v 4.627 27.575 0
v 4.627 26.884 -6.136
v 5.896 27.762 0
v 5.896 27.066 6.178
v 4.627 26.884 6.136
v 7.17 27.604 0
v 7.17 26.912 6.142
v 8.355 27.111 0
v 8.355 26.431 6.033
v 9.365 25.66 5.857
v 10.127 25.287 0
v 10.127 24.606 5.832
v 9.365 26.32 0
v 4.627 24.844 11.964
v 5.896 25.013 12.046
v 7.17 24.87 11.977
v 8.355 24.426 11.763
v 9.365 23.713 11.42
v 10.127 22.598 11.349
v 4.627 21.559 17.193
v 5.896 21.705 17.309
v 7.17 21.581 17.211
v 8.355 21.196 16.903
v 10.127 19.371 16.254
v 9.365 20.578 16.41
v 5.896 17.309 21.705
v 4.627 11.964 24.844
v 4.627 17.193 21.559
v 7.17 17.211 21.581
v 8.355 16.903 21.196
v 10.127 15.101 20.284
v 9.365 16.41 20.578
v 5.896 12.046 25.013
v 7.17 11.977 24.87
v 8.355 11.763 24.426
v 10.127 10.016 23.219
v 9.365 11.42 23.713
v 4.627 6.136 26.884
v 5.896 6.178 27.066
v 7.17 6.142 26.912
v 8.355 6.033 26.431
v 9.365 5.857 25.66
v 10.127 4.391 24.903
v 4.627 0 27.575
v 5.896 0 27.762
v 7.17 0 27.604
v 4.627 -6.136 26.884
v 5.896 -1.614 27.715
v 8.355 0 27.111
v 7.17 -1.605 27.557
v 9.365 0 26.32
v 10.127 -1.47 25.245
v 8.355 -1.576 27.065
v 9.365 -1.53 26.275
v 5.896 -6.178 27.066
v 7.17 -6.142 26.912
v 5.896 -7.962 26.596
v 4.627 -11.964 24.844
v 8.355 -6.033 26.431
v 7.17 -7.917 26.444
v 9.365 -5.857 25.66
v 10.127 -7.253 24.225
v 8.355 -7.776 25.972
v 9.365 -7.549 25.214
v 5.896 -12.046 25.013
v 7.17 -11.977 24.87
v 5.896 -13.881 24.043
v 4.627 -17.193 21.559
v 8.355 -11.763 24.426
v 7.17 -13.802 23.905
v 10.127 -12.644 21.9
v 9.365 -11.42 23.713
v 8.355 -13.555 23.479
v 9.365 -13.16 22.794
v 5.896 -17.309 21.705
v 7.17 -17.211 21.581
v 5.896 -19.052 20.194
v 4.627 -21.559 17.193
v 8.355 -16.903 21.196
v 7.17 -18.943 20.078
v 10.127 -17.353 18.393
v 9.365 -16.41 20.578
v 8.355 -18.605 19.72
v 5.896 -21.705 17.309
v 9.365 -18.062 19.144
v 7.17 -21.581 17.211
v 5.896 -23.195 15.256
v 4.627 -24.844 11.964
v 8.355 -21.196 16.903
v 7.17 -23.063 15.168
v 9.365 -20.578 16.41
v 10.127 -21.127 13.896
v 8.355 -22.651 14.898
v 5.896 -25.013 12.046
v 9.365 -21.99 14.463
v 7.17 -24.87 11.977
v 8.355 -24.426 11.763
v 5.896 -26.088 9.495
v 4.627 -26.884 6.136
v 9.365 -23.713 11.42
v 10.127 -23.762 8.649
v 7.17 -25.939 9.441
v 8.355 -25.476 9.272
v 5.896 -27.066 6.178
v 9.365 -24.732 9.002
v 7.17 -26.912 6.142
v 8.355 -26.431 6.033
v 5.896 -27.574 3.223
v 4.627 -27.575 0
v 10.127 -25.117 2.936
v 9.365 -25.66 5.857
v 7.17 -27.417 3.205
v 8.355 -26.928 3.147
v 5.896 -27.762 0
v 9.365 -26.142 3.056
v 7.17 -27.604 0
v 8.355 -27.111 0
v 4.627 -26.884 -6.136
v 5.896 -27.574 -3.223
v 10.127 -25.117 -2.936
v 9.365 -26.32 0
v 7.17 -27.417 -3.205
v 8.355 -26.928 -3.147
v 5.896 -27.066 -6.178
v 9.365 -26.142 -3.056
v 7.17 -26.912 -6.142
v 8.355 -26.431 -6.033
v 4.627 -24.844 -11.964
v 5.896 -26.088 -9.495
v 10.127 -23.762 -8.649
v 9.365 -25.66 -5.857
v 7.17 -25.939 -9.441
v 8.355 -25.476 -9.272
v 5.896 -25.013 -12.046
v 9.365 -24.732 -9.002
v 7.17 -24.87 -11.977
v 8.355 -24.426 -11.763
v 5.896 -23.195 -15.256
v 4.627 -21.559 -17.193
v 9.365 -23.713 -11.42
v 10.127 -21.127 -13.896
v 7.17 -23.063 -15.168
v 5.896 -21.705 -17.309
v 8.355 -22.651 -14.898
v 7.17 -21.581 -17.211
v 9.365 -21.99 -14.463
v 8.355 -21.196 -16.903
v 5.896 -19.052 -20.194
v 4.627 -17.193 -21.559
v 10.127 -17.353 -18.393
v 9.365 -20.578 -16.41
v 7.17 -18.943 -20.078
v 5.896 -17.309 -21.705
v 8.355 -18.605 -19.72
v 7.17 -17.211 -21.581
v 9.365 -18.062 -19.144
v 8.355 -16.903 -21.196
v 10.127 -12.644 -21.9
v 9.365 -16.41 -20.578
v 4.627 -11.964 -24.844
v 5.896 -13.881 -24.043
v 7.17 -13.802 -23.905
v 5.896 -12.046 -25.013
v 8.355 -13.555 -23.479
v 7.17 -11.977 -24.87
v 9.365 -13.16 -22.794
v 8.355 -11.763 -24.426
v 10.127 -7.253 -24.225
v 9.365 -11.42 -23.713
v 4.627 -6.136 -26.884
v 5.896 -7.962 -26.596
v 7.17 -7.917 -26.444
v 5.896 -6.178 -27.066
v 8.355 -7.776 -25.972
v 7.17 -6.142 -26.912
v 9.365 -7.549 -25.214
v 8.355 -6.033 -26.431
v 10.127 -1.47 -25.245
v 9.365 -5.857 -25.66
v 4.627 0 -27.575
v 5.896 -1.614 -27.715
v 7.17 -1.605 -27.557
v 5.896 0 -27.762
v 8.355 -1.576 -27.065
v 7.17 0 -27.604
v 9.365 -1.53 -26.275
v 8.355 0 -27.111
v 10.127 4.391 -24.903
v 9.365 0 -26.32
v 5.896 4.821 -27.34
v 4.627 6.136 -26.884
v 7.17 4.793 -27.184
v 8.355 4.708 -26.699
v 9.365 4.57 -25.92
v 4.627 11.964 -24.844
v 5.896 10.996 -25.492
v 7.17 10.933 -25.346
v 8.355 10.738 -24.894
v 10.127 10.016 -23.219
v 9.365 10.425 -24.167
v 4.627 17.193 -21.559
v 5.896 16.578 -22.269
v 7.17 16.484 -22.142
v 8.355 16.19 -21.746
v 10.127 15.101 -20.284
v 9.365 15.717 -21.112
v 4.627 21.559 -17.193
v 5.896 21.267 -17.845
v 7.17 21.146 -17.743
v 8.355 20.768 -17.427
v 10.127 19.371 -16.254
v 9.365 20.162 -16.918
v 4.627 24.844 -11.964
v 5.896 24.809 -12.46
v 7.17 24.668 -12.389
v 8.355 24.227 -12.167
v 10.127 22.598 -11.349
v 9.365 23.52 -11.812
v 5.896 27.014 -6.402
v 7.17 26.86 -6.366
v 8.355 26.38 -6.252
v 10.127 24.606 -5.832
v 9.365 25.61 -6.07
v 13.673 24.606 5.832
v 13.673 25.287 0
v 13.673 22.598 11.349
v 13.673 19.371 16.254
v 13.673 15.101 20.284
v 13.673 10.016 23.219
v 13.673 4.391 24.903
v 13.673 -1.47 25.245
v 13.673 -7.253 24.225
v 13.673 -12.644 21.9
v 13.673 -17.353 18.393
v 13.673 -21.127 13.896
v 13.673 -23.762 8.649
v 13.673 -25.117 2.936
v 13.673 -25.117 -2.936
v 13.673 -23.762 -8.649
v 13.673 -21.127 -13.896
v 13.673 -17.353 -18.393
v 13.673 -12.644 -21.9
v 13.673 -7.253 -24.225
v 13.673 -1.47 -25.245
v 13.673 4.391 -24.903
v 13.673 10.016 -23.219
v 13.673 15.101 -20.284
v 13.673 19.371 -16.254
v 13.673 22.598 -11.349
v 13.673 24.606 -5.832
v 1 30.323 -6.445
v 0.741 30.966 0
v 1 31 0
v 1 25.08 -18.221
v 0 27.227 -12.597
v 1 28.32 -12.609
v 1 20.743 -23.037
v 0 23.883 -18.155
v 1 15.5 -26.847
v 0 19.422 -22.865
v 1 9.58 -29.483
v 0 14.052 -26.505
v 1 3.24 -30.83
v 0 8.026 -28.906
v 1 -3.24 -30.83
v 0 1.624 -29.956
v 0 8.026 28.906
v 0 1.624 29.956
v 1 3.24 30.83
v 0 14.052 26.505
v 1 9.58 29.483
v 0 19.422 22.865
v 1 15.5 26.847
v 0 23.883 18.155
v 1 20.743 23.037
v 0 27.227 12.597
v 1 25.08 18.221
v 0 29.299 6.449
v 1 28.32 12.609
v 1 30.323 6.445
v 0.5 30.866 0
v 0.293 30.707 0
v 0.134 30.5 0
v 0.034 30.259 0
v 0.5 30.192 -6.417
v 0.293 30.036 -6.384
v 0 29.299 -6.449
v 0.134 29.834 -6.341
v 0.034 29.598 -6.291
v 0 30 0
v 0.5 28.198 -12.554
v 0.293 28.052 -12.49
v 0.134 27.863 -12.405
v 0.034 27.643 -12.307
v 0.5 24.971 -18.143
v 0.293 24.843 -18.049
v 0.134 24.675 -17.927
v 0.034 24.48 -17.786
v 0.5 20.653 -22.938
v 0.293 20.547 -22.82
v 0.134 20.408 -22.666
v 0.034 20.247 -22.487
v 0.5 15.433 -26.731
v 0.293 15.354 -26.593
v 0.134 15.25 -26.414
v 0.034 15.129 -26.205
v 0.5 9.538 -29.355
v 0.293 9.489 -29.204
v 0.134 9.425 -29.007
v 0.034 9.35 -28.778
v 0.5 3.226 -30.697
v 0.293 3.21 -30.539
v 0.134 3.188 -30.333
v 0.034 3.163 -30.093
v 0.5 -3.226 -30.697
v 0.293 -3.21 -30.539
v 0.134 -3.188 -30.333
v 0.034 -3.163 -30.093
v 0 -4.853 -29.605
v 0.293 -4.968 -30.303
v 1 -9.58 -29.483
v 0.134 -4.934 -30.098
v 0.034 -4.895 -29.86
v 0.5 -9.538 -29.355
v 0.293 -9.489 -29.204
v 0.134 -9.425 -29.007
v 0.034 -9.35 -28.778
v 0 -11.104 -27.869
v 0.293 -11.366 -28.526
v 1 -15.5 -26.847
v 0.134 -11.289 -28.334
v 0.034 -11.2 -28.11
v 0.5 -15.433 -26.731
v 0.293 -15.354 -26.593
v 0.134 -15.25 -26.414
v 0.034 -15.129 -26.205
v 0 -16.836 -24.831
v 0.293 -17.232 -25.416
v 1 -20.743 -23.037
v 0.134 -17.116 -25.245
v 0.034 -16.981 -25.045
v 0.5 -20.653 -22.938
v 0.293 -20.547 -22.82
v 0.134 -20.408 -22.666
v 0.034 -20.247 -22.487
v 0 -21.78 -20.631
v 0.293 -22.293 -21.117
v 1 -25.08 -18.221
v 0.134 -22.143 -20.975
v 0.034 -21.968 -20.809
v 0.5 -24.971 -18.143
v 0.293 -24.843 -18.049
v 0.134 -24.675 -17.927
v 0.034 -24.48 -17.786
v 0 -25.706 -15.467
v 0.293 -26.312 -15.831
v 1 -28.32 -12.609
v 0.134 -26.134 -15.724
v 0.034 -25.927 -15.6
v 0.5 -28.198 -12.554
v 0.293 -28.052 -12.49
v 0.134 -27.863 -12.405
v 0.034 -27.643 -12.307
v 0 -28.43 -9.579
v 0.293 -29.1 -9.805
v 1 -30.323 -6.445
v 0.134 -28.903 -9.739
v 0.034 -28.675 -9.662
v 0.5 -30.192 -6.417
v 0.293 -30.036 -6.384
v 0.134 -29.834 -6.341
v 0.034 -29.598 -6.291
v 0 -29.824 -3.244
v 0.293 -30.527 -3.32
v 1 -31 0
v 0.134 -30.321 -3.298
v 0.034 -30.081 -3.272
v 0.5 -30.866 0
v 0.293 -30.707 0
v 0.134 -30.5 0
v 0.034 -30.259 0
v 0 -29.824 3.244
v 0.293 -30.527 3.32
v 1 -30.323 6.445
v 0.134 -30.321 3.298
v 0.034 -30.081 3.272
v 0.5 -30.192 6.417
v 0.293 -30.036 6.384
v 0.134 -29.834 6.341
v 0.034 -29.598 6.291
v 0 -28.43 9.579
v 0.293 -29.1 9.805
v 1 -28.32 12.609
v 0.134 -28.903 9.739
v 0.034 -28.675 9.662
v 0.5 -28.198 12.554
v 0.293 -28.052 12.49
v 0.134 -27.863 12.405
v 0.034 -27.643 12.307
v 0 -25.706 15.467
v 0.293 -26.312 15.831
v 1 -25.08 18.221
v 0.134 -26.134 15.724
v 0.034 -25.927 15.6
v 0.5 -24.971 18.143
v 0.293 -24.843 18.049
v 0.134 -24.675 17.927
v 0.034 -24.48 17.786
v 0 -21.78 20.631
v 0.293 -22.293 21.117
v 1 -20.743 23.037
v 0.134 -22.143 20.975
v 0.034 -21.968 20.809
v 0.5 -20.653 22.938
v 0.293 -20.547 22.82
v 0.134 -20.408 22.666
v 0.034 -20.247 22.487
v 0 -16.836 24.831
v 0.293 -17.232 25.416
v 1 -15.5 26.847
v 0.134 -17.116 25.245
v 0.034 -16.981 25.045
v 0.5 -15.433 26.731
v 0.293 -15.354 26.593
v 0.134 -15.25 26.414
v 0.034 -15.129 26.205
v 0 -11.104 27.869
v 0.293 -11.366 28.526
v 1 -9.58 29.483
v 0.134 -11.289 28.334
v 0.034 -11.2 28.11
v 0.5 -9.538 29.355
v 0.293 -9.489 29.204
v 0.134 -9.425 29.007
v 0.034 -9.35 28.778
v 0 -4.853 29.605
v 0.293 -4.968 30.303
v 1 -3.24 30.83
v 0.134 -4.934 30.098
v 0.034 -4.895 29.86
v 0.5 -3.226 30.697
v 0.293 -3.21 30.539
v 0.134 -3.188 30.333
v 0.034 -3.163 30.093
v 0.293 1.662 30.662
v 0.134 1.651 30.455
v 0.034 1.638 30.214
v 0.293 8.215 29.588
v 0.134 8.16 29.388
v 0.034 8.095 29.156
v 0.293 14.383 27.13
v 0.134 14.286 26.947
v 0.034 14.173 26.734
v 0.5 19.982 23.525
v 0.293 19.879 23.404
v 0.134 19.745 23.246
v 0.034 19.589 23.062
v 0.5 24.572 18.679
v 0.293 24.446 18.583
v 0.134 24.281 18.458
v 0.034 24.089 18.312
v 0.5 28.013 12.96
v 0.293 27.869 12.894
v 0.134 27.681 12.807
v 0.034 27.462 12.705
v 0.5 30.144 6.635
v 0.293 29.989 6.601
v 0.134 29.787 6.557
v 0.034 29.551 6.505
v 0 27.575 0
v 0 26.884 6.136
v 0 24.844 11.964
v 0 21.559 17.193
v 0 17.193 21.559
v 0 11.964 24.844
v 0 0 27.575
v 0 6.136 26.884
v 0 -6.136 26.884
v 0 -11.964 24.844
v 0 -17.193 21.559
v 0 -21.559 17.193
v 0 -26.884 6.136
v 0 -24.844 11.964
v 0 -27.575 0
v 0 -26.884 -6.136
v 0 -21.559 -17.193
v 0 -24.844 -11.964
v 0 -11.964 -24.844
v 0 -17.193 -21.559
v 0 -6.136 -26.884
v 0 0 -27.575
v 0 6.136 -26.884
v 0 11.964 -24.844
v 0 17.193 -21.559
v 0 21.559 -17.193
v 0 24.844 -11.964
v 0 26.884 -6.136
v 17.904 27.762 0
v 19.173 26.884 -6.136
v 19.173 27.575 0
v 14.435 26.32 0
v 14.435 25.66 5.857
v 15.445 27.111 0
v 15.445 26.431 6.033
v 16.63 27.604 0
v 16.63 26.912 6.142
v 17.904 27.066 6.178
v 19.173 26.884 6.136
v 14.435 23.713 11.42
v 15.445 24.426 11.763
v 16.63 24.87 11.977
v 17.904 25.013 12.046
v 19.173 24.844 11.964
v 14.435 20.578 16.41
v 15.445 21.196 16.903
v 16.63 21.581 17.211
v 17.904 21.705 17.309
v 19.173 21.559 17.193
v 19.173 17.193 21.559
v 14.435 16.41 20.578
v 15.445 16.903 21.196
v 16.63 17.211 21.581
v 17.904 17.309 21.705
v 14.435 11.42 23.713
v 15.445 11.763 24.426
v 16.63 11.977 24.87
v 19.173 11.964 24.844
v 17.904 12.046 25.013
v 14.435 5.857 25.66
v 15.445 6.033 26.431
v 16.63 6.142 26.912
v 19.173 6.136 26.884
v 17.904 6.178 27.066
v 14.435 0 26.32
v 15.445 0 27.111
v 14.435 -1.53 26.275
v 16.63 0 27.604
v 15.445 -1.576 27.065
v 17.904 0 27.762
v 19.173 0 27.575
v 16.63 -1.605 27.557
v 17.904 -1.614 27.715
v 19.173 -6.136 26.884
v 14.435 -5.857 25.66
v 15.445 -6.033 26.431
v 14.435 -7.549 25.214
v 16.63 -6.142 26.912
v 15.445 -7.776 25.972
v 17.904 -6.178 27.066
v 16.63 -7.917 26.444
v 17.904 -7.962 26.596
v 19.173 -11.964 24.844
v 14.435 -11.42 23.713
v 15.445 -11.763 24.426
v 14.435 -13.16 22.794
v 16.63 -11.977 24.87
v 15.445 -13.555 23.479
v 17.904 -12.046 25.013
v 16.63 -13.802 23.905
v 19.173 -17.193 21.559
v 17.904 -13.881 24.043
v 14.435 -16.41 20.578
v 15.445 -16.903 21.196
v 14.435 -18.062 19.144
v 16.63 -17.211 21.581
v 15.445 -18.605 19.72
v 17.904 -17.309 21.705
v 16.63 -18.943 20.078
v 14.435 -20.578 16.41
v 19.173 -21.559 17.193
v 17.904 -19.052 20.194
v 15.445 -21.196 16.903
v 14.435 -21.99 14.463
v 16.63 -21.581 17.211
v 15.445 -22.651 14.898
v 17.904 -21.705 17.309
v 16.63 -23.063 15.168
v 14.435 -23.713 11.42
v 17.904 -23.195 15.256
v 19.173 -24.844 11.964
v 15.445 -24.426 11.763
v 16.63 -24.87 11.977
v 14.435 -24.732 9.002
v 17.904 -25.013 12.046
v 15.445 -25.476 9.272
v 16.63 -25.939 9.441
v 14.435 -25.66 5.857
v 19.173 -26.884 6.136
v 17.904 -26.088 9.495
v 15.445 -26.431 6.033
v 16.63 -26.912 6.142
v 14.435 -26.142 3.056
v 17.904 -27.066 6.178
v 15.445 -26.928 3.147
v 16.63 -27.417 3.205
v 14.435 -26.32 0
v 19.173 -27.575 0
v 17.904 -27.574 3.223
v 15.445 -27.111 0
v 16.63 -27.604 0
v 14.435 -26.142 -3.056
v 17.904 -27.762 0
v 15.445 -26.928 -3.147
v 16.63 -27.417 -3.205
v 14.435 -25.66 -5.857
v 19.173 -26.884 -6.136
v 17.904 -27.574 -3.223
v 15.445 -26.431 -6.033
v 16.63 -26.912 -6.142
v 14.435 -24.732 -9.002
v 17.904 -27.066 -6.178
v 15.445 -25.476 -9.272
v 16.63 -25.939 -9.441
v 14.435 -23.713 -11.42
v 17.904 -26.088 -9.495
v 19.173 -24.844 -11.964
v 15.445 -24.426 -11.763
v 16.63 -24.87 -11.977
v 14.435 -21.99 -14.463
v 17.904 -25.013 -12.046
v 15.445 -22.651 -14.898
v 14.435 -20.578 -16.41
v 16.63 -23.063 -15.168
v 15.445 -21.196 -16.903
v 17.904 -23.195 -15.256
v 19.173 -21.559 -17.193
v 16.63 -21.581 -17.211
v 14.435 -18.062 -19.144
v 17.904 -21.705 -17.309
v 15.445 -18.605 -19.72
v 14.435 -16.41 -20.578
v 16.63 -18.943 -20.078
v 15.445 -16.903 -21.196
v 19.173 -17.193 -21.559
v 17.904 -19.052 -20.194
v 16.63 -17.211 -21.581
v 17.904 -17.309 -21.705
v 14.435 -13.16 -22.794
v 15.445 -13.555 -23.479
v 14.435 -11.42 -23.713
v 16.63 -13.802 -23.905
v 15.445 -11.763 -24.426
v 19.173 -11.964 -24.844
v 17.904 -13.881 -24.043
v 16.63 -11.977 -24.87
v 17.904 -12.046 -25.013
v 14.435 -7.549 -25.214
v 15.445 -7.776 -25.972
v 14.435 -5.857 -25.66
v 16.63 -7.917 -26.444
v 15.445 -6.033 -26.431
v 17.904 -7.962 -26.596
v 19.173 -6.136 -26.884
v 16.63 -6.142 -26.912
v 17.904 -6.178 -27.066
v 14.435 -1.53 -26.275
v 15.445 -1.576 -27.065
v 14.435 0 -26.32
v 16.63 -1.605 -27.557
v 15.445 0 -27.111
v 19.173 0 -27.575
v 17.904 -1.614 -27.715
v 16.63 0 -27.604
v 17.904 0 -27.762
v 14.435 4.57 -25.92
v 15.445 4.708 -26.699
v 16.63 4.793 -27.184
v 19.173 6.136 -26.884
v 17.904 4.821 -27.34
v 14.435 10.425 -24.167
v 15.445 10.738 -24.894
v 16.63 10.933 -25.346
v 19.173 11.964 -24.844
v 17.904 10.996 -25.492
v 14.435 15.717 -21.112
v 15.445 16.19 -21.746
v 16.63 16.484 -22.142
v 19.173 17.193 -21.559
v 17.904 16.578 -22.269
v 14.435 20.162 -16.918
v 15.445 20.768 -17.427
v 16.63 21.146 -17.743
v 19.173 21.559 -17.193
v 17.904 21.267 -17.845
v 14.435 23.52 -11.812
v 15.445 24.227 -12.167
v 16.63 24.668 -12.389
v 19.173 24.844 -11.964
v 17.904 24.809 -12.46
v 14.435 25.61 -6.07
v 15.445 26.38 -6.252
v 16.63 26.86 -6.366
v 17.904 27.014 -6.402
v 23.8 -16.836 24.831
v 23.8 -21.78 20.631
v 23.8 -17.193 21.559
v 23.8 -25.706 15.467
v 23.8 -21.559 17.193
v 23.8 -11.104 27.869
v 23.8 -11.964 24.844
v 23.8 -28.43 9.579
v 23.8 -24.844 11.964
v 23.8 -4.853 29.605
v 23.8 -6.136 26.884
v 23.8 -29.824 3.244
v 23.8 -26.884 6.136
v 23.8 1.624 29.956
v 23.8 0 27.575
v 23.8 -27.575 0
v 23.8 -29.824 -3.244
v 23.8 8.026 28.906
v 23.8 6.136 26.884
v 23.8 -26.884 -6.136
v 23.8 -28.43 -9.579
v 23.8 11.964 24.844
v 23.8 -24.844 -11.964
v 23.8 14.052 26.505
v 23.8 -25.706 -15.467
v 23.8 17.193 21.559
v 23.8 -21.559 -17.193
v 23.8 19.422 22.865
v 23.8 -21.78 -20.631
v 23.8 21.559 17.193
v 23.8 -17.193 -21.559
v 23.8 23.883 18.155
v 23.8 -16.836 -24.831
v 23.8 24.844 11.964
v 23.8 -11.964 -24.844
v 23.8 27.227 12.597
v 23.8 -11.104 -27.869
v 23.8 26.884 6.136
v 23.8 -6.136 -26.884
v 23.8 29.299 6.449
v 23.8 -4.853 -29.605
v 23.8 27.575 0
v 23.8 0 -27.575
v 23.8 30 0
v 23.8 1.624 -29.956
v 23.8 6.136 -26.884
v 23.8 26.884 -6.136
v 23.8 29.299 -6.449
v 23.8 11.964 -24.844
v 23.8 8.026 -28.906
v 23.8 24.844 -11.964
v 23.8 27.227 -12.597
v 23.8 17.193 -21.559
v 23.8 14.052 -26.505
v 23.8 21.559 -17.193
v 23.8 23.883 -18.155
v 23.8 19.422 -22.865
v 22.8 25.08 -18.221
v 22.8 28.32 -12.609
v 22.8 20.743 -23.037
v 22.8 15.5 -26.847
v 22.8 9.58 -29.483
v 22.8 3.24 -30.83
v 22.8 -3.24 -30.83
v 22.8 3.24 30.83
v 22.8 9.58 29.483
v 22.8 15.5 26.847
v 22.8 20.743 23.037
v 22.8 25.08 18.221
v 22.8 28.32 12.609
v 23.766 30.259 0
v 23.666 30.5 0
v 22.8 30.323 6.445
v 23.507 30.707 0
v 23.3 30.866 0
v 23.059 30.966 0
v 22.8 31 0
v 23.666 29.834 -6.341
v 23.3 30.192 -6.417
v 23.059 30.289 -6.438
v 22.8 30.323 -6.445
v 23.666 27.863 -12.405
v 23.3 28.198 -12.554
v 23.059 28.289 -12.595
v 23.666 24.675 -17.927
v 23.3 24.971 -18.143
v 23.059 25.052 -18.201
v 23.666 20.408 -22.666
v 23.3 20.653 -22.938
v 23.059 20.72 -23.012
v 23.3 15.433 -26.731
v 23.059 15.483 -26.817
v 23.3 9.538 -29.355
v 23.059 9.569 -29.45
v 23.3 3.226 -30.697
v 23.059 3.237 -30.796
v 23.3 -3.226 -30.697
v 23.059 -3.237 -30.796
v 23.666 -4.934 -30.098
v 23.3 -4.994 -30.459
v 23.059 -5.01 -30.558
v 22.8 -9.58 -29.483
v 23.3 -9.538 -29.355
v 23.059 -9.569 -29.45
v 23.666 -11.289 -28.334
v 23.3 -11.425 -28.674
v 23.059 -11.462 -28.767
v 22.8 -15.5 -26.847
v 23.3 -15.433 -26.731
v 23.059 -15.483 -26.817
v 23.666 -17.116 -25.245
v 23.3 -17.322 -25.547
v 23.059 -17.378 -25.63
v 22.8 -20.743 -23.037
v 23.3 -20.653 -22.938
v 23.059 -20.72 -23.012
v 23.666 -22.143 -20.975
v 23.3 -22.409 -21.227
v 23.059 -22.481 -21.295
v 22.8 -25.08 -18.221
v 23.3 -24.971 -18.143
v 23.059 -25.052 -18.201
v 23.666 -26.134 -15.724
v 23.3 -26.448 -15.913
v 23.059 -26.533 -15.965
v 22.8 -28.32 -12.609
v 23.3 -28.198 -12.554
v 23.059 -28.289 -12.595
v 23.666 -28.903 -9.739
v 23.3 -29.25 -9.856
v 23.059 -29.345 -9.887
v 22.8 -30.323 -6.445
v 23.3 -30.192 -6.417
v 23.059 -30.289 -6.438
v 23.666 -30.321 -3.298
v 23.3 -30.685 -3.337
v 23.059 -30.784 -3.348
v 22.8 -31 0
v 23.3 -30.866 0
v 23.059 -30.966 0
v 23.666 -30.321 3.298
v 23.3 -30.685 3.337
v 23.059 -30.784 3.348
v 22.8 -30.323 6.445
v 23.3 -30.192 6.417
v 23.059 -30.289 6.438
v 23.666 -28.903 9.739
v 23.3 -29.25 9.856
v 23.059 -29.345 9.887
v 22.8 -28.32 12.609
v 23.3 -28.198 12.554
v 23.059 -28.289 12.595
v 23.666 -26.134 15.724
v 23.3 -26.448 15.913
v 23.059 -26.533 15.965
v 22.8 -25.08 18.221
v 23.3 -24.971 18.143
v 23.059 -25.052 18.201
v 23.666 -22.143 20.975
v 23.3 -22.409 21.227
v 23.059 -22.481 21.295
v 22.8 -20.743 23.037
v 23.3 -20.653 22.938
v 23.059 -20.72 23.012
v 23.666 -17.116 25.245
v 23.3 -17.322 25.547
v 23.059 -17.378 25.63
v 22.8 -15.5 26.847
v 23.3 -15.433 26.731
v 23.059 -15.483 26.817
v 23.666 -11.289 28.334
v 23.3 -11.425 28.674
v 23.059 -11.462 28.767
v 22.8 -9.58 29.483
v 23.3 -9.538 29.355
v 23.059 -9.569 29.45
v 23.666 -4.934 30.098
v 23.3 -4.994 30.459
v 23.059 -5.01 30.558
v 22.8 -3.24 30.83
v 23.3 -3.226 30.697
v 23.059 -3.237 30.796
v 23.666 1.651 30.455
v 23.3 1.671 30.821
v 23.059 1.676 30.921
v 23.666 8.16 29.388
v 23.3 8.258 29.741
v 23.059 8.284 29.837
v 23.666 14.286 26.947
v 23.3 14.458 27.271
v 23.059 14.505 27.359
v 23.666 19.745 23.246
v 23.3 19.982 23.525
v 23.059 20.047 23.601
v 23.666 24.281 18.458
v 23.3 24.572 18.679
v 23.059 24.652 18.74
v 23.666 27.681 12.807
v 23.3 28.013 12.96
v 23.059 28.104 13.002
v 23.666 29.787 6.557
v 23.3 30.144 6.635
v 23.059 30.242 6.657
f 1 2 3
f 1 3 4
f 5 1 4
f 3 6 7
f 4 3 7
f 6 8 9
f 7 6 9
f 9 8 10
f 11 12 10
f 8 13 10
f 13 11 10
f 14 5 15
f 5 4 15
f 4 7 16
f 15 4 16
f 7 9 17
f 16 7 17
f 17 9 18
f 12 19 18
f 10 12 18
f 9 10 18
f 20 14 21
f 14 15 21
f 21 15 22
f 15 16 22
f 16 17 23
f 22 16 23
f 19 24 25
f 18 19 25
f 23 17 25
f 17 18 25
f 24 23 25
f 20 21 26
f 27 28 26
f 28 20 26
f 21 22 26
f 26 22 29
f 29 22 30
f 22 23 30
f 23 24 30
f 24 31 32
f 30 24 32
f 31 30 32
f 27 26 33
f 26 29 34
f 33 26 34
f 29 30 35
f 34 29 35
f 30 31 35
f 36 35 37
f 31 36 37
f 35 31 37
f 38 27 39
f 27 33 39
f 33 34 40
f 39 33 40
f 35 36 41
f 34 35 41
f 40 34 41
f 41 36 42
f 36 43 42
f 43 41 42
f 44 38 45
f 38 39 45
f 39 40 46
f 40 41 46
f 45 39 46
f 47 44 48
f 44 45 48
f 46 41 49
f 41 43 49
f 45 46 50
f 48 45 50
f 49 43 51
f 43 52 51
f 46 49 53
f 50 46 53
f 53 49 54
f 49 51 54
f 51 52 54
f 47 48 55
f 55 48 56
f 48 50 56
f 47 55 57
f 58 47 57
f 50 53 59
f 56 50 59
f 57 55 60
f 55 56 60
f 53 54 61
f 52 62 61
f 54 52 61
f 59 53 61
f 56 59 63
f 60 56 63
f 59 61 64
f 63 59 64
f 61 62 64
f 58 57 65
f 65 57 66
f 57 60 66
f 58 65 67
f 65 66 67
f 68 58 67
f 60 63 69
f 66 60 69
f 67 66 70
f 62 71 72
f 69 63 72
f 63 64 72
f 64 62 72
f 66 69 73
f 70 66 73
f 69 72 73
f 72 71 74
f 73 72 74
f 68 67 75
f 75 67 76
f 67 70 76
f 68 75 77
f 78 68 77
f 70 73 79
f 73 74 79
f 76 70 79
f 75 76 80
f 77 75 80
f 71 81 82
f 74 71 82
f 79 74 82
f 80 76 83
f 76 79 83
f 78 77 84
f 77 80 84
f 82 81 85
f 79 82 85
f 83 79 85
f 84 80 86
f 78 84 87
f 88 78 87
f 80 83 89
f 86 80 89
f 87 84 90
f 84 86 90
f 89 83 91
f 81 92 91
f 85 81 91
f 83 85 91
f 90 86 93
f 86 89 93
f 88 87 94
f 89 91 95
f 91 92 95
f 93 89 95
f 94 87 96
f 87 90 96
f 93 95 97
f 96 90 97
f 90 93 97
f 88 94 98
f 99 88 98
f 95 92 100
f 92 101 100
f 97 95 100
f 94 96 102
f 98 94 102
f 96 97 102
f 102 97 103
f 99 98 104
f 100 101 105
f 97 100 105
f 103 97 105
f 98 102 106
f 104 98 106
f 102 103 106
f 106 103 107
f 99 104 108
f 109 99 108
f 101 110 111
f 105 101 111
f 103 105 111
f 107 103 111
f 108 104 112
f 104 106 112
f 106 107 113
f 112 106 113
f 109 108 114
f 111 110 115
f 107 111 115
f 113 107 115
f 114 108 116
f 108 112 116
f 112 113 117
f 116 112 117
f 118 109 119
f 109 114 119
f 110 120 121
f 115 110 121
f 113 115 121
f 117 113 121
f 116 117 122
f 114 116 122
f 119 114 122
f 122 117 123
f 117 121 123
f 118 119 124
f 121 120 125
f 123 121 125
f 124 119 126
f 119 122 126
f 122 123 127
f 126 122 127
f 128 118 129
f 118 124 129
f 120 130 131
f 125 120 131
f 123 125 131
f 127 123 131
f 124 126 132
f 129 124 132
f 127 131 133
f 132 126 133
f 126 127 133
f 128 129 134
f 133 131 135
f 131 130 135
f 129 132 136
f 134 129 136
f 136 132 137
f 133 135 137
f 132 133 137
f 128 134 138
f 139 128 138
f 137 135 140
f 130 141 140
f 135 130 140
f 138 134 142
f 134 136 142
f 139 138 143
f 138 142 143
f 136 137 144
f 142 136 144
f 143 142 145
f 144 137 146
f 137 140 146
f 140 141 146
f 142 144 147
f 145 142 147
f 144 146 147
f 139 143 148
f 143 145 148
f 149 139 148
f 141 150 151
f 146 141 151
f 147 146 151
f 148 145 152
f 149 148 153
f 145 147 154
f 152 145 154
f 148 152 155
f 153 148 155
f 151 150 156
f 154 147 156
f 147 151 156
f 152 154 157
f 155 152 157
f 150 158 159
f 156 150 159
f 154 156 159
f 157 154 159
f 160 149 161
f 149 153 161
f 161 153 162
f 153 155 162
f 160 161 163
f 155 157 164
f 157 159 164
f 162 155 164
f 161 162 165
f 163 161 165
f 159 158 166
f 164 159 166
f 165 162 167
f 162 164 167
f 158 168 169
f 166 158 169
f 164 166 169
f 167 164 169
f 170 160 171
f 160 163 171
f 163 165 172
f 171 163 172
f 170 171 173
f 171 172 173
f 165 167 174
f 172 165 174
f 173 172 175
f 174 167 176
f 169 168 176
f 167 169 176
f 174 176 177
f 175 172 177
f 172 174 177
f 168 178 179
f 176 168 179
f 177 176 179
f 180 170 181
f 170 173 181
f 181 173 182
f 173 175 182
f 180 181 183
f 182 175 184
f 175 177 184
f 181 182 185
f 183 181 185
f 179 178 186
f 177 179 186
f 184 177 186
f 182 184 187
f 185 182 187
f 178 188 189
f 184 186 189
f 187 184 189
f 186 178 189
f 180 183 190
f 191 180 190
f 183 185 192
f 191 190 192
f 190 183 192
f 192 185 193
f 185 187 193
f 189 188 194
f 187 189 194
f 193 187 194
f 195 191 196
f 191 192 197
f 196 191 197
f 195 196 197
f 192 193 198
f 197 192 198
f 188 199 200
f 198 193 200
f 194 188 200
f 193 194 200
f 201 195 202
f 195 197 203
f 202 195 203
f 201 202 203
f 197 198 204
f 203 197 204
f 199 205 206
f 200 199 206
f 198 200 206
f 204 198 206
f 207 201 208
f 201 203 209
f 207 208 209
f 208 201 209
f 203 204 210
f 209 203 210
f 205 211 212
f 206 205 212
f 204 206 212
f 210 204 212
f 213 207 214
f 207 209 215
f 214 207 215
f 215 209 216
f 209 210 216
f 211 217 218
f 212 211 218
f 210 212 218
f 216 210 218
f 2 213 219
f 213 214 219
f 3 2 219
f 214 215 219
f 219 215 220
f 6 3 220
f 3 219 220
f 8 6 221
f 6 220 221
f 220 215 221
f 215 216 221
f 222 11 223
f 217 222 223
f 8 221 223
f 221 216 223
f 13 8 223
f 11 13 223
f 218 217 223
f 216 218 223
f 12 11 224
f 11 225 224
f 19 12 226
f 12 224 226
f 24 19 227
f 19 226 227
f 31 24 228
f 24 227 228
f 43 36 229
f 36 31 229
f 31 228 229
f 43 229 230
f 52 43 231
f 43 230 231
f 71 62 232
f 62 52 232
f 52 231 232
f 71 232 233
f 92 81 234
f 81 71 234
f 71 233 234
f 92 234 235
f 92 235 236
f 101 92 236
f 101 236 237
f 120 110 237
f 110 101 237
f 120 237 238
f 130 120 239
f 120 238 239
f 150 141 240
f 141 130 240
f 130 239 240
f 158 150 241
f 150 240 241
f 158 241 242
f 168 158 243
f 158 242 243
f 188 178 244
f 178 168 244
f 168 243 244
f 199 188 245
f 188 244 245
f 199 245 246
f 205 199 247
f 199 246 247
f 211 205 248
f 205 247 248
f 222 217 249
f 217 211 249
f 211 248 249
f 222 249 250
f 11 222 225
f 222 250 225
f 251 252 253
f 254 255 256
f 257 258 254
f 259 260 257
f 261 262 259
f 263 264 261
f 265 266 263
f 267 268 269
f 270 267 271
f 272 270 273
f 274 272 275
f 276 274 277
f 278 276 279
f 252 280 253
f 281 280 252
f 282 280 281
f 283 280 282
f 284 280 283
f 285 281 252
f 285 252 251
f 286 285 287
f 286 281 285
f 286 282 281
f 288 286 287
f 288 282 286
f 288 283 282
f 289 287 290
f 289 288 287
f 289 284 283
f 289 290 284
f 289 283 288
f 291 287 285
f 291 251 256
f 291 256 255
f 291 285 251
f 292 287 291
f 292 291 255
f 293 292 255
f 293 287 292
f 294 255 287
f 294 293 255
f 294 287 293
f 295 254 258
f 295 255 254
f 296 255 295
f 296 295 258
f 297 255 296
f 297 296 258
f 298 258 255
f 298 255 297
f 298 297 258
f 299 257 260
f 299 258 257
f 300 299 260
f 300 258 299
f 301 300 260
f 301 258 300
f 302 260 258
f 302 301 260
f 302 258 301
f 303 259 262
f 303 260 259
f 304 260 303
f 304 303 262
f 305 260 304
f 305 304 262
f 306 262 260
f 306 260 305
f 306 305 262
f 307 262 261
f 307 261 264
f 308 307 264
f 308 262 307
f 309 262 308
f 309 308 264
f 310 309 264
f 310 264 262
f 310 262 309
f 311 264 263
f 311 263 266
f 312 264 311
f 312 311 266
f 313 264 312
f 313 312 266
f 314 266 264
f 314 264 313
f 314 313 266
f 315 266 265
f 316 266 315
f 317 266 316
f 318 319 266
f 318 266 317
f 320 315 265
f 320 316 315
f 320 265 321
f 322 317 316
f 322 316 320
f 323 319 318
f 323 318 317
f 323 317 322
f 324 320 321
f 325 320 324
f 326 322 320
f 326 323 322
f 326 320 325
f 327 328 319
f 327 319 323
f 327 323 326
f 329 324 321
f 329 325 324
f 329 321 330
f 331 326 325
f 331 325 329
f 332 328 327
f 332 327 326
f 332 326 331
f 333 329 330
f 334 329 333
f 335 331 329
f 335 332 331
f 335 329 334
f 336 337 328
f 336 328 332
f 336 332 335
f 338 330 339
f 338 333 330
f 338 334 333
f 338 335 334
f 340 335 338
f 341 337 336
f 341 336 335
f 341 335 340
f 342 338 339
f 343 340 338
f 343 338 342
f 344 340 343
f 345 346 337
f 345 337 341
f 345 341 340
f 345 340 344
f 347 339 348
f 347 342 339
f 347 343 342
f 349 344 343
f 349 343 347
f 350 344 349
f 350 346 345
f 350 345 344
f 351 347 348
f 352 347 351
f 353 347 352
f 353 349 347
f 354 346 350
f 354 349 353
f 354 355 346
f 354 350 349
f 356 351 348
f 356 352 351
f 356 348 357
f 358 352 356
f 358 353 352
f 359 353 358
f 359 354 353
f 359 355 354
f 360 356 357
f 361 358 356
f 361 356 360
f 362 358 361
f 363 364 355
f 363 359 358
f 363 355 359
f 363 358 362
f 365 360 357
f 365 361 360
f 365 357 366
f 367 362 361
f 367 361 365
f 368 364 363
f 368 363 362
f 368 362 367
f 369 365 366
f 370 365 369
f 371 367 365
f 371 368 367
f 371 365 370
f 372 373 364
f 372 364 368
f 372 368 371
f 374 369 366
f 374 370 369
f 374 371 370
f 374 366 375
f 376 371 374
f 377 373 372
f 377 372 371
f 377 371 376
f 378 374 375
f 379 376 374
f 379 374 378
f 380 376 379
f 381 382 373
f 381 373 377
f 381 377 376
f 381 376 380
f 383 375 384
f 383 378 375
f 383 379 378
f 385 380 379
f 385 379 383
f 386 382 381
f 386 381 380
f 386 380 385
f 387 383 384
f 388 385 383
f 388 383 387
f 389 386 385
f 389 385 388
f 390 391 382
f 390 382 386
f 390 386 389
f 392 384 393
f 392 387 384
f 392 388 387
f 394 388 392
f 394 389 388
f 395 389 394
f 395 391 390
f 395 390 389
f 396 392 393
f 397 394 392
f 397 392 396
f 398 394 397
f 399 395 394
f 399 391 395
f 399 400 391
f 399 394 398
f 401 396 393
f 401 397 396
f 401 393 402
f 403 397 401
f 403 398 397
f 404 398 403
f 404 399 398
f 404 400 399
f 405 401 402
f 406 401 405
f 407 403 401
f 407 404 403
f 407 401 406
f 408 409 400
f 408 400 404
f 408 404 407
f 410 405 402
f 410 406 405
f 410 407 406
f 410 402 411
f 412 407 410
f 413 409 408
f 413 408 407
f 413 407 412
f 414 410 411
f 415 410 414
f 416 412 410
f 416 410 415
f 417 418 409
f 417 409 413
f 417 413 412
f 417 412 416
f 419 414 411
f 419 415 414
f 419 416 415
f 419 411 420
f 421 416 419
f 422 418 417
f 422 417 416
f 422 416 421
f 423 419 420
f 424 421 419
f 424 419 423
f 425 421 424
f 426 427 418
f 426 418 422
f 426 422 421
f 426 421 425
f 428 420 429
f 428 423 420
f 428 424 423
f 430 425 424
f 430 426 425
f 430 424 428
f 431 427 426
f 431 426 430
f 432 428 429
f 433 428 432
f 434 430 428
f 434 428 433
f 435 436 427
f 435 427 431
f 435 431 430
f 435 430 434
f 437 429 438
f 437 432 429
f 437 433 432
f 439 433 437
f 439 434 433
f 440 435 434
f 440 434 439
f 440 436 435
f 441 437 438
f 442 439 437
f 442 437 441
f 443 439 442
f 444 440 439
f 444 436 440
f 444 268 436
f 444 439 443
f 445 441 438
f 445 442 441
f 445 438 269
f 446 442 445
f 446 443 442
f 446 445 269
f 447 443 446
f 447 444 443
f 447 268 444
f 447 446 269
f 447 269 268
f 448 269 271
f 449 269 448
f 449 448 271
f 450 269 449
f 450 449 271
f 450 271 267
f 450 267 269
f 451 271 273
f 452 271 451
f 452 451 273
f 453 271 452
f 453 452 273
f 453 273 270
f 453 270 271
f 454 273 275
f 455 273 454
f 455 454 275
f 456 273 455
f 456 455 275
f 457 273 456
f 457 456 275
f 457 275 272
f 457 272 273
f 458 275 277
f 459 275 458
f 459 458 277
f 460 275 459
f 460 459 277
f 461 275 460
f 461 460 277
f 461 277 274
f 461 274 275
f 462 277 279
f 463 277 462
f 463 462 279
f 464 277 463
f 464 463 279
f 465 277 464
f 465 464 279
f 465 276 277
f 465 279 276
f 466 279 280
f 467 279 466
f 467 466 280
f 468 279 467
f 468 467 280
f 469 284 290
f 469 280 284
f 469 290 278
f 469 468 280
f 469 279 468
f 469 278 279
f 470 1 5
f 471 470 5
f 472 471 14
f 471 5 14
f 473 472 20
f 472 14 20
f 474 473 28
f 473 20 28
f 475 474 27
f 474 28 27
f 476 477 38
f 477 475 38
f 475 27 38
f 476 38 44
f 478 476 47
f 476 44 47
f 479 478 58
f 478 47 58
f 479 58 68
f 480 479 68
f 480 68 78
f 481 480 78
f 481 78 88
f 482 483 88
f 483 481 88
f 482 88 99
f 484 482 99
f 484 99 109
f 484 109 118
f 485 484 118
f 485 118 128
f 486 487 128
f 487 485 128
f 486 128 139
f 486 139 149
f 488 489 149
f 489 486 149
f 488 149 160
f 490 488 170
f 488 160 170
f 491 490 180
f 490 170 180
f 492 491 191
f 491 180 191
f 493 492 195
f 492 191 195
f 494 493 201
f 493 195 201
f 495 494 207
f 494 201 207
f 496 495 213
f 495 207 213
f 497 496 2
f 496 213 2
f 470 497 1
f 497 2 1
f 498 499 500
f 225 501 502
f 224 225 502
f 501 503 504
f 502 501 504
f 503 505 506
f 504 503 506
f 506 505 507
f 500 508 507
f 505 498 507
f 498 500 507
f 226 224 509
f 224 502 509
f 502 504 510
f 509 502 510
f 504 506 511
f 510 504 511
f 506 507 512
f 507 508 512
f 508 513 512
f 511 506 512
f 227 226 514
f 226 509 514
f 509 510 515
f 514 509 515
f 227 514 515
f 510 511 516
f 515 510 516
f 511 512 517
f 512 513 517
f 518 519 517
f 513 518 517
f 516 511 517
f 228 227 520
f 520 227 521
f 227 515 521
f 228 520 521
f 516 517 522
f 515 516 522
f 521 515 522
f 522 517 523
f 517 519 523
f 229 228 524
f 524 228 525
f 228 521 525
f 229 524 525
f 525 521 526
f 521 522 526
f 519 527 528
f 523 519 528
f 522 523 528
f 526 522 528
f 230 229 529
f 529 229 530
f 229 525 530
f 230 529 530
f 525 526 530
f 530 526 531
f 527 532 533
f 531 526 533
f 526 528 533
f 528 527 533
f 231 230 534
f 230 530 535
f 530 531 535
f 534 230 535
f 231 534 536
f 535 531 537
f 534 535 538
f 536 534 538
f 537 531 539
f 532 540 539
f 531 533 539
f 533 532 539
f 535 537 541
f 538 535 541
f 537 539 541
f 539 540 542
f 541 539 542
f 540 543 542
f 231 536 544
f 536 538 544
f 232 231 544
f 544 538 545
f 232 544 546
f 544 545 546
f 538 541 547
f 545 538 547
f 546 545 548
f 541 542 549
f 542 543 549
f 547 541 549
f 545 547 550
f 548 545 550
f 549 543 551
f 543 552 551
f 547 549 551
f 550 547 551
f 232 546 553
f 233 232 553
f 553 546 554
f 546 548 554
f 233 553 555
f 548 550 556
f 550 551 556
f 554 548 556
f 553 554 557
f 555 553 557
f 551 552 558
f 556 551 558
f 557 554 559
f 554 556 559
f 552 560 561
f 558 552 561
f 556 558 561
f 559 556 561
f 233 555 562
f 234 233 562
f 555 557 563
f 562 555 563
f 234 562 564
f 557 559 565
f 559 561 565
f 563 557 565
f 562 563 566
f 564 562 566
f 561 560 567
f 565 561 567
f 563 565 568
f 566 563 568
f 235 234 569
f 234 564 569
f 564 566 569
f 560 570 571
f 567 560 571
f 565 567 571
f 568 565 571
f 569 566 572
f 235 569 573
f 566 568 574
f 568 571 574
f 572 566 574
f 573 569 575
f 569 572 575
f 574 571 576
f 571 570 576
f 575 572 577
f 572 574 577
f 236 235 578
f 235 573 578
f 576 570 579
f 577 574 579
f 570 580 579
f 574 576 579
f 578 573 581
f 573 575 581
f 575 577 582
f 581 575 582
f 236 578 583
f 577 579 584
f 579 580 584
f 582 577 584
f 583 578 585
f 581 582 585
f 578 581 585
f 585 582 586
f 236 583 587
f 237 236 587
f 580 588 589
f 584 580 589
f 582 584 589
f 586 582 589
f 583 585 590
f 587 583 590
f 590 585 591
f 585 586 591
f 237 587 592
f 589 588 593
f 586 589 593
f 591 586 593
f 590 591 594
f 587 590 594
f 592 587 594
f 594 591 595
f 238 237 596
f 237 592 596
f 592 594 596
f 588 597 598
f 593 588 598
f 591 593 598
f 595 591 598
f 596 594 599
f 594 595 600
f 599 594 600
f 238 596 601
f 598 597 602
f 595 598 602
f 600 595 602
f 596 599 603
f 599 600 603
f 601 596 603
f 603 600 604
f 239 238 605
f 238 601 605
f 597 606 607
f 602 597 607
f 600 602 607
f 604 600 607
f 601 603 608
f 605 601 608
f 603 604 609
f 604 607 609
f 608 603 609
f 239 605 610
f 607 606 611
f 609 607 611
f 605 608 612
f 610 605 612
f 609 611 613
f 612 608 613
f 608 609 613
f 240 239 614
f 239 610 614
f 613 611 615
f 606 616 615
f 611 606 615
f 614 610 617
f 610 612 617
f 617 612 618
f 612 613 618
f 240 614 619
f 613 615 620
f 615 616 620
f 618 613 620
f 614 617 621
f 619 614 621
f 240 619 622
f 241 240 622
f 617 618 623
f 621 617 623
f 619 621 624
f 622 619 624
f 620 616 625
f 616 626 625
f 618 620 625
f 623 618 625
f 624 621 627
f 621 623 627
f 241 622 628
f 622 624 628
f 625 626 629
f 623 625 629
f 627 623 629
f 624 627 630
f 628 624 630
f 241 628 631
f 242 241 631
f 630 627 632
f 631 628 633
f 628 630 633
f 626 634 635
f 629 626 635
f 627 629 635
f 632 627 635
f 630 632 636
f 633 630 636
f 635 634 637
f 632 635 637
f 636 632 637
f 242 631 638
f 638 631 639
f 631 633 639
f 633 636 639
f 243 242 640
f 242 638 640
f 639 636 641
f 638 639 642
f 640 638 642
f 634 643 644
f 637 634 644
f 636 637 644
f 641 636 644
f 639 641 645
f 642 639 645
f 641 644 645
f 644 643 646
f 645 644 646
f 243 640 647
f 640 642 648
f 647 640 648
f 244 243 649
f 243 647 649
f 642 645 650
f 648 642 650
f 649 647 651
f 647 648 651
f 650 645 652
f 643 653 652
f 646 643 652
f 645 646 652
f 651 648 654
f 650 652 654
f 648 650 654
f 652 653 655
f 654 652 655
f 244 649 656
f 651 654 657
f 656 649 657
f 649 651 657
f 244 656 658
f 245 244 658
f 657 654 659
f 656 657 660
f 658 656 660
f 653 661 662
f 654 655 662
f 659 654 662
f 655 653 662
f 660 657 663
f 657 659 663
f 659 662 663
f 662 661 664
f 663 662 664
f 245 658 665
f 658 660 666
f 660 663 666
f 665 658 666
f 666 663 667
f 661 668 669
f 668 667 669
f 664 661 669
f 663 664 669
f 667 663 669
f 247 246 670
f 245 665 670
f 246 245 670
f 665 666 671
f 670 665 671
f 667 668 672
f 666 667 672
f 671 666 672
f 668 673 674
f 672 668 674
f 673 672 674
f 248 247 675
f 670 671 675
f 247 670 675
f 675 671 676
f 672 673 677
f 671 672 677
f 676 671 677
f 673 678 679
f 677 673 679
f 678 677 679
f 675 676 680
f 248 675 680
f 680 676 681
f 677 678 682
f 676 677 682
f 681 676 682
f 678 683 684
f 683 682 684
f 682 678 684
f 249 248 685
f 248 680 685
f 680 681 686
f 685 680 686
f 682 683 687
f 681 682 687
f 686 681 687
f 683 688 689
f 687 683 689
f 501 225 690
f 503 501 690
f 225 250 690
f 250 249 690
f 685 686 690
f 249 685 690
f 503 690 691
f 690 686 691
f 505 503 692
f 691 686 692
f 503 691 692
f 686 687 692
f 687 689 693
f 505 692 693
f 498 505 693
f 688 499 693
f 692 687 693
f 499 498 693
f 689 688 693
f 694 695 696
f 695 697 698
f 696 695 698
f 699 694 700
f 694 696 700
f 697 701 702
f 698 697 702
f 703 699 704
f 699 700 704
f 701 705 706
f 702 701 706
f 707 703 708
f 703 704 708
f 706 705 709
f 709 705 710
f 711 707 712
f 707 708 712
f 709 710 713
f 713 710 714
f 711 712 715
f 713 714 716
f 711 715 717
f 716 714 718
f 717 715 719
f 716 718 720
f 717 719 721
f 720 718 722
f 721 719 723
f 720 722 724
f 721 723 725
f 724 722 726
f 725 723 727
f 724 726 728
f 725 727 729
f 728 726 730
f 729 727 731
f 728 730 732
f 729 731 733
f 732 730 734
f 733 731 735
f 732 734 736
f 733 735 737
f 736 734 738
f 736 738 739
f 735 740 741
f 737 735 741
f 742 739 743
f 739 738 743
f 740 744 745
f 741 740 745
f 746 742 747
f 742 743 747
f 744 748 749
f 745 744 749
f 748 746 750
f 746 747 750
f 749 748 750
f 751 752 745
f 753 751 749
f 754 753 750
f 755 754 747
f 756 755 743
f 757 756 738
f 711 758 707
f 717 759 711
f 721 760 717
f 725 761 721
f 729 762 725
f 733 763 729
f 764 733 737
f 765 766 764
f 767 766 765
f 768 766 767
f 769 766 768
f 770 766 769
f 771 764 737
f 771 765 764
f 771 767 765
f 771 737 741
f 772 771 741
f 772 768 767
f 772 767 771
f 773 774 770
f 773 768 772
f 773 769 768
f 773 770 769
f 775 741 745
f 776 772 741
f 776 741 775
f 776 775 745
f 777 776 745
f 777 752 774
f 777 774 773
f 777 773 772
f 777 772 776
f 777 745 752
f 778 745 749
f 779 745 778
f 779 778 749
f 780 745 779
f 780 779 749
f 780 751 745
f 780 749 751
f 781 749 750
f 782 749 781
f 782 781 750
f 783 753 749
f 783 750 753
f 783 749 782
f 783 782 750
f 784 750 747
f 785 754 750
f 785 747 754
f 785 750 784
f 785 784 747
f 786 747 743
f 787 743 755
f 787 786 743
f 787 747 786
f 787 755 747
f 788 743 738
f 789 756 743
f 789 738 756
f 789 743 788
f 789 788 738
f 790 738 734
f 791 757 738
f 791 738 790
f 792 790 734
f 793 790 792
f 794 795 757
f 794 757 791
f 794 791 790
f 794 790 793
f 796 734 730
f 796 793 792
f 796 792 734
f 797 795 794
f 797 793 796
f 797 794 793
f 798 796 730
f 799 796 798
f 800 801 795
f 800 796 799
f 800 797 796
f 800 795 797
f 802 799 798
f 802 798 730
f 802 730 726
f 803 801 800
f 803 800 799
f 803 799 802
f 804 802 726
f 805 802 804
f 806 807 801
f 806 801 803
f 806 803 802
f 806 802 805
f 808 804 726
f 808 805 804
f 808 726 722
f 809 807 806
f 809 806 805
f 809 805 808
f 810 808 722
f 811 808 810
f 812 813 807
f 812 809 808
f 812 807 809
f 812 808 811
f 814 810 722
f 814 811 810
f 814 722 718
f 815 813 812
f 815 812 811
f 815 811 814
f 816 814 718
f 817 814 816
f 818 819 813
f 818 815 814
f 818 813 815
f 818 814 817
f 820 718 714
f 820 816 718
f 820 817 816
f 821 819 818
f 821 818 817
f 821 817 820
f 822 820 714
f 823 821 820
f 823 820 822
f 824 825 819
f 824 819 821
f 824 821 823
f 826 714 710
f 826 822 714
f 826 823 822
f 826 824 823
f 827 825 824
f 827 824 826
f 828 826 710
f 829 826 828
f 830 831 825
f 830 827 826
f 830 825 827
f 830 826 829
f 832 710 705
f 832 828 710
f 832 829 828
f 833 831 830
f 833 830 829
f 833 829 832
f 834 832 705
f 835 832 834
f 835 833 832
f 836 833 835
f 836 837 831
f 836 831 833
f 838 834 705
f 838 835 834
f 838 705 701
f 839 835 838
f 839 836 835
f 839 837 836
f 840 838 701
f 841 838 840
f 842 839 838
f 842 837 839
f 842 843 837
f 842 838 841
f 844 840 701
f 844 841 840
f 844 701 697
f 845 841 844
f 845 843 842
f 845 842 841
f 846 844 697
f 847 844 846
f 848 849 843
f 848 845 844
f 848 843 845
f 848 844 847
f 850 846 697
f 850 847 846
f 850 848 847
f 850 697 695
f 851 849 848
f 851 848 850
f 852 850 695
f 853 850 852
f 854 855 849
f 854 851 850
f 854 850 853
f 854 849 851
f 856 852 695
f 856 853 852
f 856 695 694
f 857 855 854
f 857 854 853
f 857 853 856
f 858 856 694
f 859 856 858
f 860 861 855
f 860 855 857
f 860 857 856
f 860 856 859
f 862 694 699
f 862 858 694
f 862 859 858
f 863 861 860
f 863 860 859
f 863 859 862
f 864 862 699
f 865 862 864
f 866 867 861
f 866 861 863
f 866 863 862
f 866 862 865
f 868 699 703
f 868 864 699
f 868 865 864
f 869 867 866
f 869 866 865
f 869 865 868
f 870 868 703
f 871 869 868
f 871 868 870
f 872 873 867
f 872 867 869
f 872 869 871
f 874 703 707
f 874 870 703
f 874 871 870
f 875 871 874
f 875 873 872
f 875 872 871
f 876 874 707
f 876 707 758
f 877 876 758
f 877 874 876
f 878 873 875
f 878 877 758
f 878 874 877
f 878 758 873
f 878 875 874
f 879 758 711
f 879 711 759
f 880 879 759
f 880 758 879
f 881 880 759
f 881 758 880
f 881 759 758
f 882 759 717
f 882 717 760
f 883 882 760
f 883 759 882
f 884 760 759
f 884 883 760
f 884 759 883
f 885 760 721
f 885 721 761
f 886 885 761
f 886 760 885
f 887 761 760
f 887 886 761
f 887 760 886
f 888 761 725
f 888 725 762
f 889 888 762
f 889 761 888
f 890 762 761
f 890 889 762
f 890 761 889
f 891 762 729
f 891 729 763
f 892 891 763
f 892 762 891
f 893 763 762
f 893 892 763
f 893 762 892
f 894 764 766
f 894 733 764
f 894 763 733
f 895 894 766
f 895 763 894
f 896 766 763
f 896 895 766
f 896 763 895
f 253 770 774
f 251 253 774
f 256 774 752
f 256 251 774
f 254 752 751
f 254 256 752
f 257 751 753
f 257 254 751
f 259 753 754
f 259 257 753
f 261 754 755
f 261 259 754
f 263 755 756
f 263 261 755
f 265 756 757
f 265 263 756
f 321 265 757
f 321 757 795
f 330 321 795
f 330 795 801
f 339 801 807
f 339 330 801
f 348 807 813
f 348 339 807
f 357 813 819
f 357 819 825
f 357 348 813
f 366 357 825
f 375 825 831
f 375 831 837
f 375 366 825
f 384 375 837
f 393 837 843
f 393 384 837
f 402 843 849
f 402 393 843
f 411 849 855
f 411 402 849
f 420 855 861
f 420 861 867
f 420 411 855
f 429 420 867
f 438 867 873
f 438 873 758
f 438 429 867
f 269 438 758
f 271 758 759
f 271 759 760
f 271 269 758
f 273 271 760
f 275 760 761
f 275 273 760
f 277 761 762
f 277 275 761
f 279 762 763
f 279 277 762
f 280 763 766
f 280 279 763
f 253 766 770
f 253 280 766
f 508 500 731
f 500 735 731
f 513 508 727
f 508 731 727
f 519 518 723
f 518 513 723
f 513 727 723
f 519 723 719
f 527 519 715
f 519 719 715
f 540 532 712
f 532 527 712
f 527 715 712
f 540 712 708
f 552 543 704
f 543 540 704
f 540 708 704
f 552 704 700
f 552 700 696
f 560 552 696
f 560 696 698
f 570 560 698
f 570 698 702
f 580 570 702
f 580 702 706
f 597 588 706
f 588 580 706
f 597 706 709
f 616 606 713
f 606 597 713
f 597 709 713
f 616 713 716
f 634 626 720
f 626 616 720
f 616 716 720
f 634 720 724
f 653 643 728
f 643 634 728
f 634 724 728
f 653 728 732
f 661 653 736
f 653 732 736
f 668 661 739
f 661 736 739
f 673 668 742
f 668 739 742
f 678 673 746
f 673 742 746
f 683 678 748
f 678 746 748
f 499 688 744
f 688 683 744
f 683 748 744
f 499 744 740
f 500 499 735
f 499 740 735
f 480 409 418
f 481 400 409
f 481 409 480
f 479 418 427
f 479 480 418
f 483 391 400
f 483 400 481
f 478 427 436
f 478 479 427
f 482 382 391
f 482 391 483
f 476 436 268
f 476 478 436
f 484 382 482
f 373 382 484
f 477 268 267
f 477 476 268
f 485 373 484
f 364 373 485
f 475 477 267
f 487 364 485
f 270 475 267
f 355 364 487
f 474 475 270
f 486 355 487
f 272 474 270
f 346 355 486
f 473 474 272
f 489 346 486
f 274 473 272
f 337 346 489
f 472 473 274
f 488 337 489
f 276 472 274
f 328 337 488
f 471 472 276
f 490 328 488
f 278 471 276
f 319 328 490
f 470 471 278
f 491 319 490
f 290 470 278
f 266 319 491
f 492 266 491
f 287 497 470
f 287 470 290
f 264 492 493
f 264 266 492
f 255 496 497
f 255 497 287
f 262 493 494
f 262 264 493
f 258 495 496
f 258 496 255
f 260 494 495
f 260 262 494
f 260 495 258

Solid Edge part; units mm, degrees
sketch "Sketch1" plane through (0, 0, 0) normal (0, 0, 1) x (1, 0, 0)
  line L0 (0, 30) -> (0, 27.575)
  line L1 (0, 27.575) -> (4.6268, 27.575)
  arc A0 (4.6268, 27.575) -> (10.1272, 25.2875) centre (5.95, 23) cw
  line L2 (10.1272, 25.2875) -> (13.6728, 25.2875)
  arc A1 (13.6728, 25.2875) -> (19.1732, 27.575) centre (17.85, 23) cw
  line L3 (19.1732, 27.575) -> (23.8, 27.575)
  line L4 (23.8, 27.575) -> (23.8, 30)
  arc A2 (23.8, 30) -> (22.8, 31) centre (22.8, 30) ccw
  line L5 (22.8, 31) -> (1, 31)
  arc A3 (1, 31) -> (0, 30) centre (1, 30) ccw
revolve "RevolvedProtrusion1" add sketch "Sketch1" angle 360 about axis through (23.8, 0, 0) along (-1, 0, 0)
properties part number "3206 A-2RS1_PART2"
